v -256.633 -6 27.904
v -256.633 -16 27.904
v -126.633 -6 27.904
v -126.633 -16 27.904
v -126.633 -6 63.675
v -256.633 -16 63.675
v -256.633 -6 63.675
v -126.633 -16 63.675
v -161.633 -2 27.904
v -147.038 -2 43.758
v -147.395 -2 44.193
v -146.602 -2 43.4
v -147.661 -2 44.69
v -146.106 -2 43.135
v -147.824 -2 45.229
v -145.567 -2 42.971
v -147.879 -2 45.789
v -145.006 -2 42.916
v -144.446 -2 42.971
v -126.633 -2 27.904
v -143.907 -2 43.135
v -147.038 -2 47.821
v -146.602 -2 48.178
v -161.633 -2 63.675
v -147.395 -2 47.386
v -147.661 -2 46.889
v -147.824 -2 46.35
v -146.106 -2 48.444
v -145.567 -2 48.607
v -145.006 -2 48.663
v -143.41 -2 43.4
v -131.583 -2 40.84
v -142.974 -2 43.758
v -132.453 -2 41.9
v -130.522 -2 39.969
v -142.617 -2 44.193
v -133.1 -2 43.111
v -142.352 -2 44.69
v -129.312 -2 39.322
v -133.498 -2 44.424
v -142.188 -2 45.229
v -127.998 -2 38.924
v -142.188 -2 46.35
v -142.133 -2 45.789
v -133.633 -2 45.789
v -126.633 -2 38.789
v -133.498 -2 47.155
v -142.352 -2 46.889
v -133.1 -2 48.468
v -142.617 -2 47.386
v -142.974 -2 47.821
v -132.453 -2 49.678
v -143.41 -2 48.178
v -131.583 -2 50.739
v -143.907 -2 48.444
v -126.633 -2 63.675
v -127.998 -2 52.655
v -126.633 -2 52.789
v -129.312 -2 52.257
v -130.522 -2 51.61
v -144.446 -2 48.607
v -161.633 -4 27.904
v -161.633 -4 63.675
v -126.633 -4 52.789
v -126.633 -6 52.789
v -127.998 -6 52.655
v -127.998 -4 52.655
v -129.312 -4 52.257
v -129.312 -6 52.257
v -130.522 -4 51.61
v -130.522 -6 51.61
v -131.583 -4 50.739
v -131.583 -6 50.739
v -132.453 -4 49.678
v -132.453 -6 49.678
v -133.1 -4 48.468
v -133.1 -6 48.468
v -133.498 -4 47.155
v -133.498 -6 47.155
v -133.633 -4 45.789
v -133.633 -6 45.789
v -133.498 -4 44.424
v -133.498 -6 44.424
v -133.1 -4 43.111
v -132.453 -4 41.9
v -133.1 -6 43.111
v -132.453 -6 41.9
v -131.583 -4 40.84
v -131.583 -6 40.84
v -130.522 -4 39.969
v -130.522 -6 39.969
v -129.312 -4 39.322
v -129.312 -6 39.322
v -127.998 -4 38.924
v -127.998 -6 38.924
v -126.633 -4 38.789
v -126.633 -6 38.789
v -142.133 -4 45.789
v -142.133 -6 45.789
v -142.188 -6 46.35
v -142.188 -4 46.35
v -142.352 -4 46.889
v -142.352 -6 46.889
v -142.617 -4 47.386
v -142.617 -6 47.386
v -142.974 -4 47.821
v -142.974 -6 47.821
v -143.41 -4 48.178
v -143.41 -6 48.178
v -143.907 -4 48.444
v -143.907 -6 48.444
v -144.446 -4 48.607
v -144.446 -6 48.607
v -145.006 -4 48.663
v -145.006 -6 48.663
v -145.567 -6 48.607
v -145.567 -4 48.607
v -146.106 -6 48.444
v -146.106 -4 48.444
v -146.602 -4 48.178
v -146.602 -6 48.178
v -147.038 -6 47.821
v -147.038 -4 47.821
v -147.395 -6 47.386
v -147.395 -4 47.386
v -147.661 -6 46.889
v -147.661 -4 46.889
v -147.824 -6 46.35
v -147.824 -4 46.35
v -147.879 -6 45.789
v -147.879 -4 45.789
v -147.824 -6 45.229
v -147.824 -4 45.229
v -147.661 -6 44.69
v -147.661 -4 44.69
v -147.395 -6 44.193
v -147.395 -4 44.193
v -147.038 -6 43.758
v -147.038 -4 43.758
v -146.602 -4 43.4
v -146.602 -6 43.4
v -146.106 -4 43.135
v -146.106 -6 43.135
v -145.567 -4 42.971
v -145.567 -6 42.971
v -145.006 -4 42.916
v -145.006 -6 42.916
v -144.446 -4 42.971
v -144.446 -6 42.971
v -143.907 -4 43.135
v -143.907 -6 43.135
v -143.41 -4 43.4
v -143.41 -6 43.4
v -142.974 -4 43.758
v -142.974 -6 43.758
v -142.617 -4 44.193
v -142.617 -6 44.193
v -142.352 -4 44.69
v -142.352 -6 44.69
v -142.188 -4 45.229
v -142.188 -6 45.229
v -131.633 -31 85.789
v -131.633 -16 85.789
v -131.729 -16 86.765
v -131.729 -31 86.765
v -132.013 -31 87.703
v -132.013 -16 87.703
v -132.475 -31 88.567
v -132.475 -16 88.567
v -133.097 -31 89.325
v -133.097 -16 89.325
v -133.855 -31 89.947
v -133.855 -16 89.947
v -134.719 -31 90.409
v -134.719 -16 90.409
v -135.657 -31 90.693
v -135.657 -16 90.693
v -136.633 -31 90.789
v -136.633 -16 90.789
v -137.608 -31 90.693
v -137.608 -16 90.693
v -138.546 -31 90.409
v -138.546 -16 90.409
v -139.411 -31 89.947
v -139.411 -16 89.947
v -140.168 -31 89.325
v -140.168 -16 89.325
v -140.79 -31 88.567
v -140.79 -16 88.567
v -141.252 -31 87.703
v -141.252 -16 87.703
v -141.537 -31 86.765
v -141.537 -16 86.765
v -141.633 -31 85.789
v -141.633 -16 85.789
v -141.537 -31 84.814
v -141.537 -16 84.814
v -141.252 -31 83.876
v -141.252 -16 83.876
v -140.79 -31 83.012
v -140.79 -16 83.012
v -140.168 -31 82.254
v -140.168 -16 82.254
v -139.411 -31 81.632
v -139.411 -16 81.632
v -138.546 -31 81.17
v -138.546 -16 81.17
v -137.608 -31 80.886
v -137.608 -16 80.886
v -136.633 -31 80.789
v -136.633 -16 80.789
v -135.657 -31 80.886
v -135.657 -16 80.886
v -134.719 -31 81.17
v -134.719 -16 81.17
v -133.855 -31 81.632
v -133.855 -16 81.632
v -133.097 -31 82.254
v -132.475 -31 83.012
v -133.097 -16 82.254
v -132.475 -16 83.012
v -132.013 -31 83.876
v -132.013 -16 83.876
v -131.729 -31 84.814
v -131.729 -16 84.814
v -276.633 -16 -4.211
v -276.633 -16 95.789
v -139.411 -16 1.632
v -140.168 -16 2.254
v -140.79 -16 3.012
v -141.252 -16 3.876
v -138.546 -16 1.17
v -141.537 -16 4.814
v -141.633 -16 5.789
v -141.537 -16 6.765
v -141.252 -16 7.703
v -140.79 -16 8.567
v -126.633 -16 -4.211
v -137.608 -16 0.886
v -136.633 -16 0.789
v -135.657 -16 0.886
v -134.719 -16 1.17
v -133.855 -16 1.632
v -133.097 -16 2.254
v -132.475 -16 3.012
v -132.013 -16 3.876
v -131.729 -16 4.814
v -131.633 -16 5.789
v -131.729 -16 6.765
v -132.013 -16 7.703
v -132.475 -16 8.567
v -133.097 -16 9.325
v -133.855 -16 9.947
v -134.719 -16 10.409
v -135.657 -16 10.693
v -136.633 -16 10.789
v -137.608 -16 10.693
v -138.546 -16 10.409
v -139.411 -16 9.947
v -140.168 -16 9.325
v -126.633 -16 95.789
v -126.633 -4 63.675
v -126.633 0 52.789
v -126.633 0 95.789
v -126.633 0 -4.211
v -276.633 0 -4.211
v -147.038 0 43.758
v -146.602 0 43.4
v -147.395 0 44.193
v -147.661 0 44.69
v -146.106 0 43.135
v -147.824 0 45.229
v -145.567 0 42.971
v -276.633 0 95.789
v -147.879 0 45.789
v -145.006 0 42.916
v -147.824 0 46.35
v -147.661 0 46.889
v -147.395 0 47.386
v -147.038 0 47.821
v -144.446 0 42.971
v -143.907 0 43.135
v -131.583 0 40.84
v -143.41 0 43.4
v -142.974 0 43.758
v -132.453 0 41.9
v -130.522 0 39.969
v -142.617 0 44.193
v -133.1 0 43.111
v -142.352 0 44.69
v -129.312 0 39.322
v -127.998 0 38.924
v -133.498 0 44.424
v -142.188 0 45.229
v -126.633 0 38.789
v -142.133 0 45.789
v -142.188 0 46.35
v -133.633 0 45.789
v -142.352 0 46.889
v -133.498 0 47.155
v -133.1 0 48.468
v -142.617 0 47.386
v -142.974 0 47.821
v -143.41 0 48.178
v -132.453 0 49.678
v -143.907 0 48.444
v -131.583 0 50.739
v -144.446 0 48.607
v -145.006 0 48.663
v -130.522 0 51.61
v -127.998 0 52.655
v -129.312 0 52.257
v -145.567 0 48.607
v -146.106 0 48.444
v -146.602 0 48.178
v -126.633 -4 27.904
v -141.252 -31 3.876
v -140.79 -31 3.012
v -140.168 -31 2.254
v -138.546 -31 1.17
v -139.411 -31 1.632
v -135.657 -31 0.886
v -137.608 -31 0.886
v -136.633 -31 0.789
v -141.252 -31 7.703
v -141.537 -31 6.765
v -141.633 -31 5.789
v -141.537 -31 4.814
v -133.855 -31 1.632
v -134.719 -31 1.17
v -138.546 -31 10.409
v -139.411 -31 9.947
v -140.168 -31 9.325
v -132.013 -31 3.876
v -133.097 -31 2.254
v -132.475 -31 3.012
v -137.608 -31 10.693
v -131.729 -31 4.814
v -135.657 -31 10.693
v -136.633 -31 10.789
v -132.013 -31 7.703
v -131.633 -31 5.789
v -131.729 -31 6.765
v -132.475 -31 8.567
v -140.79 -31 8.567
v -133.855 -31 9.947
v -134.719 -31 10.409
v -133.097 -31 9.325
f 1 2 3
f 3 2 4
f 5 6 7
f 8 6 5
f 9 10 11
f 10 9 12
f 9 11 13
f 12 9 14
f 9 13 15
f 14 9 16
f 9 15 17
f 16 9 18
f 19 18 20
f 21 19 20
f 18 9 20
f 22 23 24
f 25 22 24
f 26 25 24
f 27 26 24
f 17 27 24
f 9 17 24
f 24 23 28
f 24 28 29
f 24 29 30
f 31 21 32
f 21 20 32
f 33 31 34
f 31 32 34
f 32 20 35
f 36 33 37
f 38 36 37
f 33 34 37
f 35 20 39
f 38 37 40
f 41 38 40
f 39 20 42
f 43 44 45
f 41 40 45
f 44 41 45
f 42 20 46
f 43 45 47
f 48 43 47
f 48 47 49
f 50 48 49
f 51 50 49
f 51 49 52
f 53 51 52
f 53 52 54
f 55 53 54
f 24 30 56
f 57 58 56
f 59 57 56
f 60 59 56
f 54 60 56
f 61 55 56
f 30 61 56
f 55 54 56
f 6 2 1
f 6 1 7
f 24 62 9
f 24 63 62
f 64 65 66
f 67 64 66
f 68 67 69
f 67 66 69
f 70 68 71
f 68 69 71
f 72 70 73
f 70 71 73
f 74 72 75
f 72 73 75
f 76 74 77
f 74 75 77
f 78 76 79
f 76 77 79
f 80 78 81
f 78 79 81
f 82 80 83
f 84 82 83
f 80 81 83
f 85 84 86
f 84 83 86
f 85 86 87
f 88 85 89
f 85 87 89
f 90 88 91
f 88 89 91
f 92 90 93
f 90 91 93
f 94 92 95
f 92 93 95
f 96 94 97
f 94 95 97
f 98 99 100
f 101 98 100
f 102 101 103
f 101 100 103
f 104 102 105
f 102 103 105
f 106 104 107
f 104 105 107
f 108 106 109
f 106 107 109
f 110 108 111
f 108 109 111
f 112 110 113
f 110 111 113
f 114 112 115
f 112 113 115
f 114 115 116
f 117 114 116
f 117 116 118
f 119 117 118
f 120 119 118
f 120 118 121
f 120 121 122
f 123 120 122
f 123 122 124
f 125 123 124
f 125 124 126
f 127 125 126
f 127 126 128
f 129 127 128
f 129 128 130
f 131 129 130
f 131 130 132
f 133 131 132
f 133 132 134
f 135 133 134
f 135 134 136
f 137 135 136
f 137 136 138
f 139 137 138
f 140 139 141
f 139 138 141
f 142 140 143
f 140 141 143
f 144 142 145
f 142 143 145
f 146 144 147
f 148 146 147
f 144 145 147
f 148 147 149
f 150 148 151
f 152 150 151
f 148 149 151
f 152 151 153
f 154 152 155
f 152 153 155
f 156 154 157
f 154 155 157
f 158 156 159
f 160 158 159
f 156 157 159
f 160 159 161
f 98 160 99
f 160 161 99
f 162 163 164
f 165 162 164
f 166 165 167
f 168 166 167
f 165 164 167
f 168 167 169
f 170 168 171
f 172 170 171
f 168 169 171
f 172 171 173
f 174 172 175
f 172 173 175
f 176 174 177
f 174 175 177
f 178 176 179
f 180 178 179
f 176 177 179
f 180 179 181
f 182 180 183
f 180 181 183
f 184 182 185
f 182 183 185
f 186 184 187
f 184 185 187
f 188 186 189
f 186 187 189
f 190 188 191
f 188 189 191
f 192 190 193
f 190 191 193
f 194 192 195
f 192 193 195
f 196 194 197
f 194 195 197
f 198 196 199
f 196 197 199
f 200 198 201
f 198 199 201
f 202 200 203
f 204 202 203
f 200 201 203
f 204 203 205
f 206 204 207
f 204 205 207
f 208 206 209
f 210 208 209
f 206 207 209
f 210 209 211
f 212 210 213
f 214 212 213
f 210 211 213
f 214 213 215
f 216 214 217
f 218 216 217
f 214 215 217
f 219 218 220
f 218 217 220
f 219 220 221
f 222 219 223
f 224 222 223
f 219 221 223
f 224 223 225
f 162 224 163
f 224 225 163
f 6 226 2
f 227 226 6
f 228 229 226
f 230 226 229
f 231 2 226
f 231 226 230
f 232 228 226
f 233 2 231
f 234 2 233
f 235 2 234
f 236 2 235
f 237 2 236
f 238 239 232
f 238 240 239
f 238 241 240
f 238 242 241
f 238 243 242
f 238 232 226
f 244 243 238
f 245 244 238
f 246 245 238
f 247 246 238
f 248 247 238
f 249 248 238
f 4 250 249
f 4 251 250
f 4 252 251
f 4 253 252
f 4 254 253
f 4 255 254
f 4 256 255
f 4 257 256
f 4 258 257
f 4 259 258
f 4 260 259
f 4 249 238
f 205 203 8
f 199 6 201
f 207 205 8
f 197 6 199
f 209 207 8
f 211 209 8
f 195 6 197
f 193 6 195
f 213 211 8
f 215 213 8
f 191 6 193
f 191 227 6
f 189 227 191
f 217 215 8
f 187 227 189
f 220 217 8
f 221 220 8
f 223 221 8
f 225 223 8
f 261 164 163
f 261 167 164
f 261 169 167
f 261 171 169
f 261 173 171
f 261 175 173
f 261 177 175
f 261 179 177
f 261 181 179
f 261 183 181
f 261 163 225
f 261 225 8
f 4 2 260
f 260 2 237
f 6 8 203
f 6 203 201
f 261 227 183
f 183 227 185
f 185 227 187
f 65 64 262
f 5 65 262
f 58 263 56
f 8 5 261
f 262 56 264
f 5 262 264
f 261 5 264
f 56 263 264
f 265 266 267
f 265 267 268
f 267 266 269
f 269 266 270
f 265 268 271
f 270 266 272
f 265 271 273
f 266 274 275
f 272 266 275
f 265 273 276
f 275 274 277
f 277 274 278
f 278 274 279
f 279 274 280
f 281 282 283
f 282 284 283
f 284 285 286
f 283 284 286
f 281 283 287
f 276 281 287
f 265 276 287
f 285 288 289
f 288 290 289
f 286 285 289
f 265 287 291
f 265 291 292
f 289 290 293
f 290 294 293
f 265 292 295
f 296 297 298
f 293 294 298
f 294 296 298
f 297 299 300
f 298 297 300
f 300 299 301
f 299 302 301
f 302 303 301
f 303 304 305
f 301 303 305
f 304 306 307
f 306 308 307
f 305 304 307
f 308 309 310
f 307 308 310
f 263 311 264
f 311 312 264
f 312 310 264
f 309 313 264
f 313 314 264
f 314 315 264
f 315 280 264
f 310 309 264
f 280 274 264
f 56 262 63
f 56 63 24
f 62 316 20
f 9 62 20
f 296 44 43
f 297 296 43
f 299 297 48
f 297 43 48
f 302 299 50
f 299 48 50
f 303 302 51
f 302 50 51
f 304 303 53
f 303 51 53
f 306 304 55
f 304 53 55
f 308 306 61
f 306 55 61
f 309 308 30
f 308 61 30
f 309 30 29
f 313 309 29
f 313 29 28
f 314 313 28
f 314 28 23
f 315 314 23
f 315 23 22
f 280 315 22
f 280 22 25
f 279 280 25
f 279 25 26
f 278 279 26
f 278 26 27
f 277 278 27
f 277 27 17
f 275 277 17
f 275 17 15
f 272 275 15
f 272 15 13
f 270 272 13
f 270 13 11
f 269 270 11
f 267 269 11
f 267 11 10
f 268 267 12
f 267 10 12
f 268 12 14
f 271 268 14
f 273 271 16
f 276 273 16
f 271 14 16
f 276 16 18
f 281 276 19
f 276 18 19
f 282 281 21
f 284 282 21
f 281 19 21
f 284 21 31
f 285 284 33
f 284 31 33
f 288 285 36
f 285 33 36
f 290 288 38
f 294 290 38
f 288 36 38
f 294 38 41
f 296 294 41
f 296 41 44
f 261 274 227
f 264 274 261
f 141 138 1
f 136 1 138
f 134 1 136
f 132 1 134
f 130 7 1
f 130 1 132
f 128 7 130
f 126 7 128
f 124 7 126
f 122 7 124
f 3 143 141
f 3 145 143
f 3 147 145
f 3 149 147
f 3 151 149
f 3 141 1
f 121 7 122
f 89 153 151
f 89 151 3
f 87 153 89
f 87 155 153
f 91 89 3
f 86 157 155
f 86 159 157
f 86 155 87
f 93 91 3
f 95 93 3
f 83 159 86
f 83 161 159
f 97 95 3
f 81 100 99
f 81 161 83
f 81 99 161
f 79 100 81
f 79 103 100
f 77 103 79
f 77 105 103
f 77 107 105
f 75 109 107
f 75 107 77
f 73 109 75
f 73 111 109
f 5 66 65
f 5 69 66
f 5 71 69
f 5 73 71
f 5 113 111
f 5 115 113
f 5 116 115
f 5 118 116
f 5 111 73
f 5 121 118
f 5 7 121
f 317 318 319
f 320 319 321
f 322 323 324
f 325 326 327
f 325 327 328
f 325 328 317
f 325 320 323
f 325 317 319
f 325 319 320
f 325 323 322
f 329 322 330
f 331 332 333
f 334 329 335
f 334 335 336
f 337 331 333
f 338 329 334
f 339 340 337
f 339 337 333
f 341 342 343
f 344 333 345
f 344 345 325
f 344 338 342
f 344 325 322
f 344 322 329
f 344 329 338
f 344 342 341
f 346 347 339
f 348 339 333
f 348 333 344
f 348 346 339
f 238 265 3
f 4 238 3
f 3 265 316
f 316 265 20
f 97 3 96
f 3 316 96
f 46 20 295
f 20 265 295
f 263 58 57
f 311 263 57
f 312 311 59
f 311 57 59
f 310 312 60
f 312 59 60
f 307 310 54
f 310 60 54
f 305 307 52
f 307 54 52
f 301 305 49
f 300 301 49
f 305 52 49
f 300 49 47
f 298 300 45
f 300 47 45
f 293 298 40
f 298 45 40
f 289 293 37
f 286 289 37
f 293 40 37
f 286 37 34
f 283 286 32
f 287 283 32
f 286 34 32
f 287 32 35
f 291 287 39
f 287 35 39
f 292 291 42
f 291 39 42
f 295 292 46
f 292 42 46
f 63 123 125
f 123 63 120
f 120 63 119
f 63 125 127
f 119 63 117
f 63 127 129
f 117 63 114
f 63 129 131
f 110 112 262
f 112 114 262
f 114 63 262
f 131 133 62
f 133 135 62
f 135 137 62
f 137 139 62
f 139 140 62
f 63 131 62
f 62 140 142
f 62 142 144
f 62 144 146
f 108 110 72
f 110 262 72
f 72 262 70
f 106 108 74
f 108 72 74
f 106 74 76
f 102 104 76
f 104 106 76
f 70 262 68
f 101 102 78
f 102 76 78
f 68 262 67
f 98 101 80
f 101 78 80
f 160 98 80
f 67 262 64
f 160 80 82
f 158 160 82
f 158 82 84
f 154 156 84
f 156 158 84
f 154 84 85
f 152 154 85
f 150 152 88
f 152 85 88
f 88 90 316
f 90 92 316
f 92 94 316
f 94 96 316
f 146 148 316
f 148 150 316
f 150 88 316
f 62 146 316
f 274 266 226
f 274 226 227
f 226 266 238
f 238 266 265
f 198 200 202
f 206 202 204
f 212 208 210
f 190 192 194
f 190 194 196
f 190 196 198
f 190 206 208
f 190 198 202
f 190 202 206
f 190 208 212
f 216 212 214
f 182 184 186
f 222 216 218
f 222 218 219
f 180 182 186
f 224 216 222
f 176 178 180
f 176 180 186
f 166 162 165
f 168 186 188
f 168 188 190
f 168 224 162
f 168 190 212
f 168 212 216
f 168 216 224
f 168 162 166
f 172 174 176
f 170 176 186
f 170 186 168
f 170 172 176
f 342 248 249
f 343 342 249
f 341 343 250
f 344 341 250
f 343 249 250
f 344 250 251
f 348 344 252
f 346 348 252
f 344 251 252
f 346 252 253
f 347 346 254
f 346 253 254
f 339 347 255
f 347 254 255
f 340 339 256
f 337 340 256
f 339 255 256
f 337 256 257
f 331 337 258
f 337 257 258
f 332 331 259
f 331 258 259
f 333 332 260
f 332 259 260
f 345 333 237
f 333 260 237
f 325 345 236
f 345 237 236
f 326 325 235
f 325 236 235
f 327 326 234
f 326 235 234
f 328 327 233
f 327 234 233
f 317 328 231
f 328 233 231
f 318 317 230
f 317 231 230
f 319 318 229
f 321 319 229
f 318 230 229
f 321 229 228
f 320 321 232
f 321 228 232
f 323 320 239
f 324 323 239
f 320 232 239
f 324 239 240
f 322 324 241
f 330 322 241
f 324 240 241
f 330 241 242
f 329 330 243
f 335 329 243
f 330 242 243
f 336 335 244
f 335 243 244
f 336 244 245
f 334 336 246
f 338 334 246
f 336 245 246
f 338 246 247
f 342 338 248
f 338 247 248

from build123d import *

# Parameters (mm, degrees)
F0_W     = 150
F0_H     = 100
F1_DEPTH = 16
F2_R     = 5
F3_DEPTH = 15
F4_W     = 130
F4_H     = 35.7704423368
F5_DEPTH = 10
F6_R     = 2.8732308489
F7_DEPTH = 7
F8_W     = 2
F8_H     = 10.8852211684
F8_H_2   = 14
F9_DEPTH = 35


with BuildPart() as f1:
    # F0 (on Front) → F1 (new body)
    with BuildSketch(Plane.XZ):
        with Locations((-201.6328409241, 45.7894764841)):
            Rectangle(F0_W, F0_H)
    extrude(amount=F1_DEPTH)

    # F2 (on face) → F3 (join)
    with BuildSketch(Plane.XZ.offset(16)):
        with Locations((-136.6328409241, 85.7894764841)):
            Circle(F2_R)
        with Locations((-136.6328409241, 5.7894764841)):
            Circle(F2_R)
    extrude(amount=F3_DEPTH)

    # F4 (on face) → F5 (cut)
    with BuildSketch(Plane.XZ.offset(16)):
        with Locations((-191.6328409241, 45.7894764841)):
            Rectangle(F4_W, F4_H)
    extrude(amount=-F5_DEPTH, mode=Mode.SUBTRACT)

    # F6 (on face) → F7 (cut)
    with BuildSketch(Plane.XZ.offset(6)):
        with Locations((-145.006071773, 45.7894764841)):
            Circle(F6_R)
        with BuildLine():
            Line((-126.6328409241, 38.7894764841), (-126.6328409241, 52.7894764841))
            ThreePointArc((-126.6328409241, 52.7894764841), (-133.6328409241, 45.7894764841), (-126.6328409241, 38.7894764841))
        make_face()
        with BuildLine():
            ThreePointArc((-126.6328409241, 38.7894764841), (-121.6830934558, 40.8397290158), (-119.6328409241, 45.7894764841))
            ThreePointArc((-119.6328409241, 45.7894764841), (-121.6830934558, 50.7392239524), (-126.6328409241, 52.7894764841))
            Line((-126.6328409241, 52.7894764841), (-126.6328409241, 38.7894764841))
        make_face()
    extrude(amount=-F7_DEPTH, mode=Mode.SUBTRACT)

    # F8 (on face) → F9 (cut)
    with BuildSketch(Plane.YZ.offset(-126.6328409241)):
        with Locations((-3, 33.3468658999)):
            Rectangle(F8_W, F8_H)
        with Locations((-3, 45.7894764841)):
            Rectangle(F8_W, F8_H_2)
        with Locations((-3, 58.2320870683)):
            Rectangle(F8_W, F8_H)
    extrude(amount=-F9_DEPTH, mode=Mode.SUBTRACT)


solid = f1.part
